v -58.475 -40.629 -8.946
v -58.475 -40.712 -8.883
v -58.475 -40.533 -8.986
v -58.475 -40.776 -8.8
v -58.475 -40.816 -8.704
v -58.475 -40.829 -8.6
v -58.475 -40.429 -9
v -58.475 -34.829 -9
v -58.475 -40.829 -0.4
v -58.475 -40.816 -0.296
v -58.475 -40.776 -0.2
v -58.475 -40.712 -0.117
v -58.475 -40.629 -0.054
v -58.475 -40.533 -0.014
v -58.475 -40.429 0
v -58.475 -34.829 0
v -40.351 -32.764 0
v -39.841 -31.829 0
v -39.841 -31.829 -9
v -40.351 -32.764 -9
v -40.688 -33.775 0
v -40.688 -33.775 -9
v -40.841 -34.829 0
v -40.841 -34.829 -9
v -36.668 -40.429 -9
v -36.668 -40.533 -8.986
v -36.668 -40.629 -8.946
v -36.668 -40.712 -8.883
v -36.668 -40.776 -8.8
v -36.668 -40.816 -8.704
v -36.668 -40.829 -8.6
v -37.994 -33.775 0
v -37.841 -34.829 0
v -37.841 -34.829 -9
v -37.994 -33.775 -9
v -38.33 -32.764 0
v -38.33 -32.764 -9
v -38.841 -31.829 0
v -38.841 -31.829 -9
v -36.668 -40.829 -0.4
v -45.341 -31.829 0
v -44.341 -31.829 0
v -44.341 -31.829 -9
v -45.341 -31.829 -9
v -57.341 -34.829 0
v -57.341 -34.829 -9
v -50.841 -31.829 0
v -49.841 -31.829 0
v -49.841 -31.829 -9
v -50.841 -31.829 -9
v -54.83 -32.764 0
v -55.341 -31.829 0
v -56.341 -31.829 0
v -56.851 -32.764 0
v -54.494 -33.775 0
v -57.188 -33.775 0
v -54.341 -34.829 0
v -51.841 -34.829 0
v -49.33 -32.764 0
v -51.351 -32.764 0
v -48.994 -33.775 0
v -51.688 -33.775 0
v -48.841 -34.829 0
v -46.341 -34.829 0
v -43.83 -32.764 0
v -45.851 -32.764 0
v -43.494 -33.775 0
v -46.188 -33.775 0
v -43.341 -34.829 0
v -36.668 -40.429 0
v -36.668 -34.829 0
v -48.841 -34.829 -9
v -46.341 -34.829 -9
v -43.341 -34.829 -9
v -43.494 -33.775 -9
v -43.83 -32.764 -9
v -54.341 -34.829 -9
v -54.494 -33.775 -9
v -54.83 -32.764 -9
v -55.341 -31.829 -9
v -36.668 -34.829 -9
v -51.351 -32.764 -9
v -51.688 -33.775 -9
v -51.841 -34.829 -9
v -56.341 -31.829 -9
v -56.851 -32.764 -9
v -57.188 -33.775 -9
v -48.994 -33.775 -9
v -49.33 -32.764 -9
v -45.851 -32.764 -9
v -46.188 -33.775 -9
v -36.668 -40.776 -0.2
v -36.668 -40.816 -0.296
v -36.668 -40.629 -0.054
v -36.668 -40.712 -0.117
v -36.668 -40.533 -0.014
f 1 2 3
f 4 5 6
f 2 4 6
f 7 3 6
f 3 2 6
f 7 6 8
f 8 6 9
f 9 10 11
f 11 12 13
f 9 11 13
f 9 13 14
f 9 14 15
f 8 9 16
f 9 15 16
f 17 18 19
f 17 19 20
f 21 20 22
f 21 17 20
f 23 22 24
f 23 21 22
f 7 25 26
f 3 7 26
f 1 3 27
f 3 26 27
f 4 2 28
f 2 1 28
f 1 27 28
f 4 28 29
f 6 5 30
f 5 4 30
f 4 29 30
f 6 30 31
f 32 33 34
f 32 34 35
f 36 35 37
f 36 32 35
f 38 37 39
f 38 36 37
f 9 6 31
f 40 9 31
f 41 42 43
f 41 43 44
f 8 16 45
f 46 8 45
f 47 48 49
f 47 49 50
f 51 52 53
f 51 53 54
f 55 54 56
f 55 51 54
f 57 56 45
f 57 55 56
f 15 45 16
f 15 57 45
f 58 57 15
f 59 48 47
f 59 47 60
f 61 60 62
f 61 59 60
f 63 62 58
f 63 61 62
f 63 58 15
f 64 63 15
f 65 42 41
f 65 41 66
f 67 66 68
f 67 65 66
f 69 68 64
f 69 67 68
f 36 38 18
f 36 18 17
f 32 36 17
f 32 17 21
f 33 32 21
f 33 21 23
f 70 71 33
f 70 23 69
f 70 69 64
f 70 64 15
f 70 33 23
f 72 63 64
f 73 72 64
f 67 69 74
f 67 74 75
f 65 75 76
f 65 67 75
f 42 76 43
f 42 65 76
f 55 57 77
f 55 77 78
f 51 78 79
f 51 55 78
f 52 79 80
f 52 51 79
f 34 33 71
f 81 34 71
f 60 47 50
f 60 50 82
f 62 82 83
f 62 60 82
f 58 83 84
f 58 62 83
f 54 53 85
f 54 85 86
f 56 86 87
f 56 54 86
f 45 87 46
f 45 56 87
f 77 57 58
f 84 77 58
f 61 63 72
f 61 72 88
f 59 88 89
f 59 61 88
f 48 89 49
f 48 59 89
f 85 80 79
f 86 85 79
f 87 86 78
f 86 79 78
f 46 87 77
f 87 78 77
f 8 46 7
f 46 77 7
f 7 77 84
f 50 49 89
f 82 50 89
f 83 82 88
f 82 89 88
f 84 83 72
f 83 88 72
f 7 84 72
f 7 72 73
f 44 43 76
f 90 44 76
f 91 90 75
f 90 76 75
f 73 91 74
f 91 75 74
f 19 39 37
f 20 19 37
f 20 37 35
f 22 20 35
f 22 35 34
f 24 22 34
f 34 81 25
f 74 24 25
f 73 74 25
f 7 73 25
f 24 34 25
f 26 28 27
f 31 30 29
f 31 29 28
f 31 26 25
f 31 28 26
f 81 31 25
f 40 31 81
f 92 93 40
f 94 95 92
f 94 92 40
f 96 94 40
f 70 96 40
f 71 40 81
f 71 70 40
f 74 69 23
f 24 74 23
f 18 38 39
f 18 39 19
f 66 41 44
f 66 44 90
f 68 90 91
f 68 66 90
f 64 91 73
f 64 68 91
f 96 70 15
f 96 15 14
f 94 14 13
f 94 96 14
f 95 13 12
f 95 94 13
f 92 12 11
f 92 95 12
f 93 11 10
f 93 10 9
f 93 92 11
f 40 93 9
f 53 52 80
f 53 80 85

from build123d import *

# Parameters (mm, degrees)
SKETCH1_W                 = 230
SKETCH1_H                 = 6
BOSS_EXTRUDE1_DEPTH       = 9
BOSS_EXTRUDE2_DEPTH       = 9
LPATTERN1_COUNT           = 41
LPATTERN1_PITCH           = 5.5
SKETCH2_W                 = 15
SKETCH2_H                 = 20
BOSS_EXTRUDE3_DEPTH       = 5
FILLET1_R                 = 10
FILLET2_R                 = 3
SKETCH3_W                 = 13
SKETCH3_H                 = 8
BOSS_EXTRUDE4_DEPTH       = 5
SKETCH4_W                 = 3
SKETCH4_H                 = 8
BOSS_EXTRUDE5_DEPTH       = 5
FILLET3_R                 = 0.4
F_3_0MM_DOWEL_HOLE1_D     = 2.7
F_3_0MM_DOWEL_HOLE1_DEPTH = 7
F_3_0MM_DOWEL_HOLE1_TIP   = 0.811161836
SKETCH6_W                 = 22.006931309
SKETCH6_H                 = 16.378230192
SKETCH6_W_2               = 21.806931309
SKETCH6_H_2               = 16.178230192
CUT_EXTRUDE1_DEPTH        = 180.611613715


with BuildPart() as part:
    # Sketch1 → Boss-Extrude1 (new body)
    with BuildSketch(Plane.XY):
        with Locations((54.307342656, -37.82930415)):
            Rectangle(SKETCH1_W, SKETCH1_H)
    extrude(amount=-BOSS_EXTRUDE1_DEPTH)

    # Sketch1<3> → Boss-Extrude2 (add)
    with BuildSketch(Plane.XY):
        with BuildLine():
            ThreePointArc((-56.340727793, -31.82930415), (-57.041926016, -33.262238075), (-57.340727793, -34.82930415))
            Line((-57.340727793, -34.82930415), (-54.340727793, -34.82930415))
            ThreePointArc((-54.340727793, -34.82930415), (-54.63952957, -33.262238075), (-55.340727793, -31.82930415))
            Line((-55.340727793, -31.82930415), (-56.340727793, -31.82930415))
        make_face()
    boss_extrude2 = extrude(amount=-BOSS_EXTRUDE2_DEPTH)

    # LPattern1: Boss-Extrude2 ×41
    with Locations(*[(i * LPATTERN1_PITCH, 0, 0) for i in range(1, LPATTERN1_COUNT)]):
        add(boss_extrude2)

    # Sketch2 → Boss-Extrude3 (add)
    with BuildSketch(Plane.XZ.offset(40.82930415)):
        with Locations((-68.192657344, -4.5)):
            Rectangle(SKETCH2_W, SKETCH2_H)
    extrude(amount=-BOSS_EXTRUDE3_DEPTH)

    # Fillet1
    # the kernel refuses this fillet: 10 mm, written as the material it adds along each edge
    with BuildSketch(Plane(origin=(-60.692657344, -35.82930415, 0), x_dir=(0, 1, 0), z_dir=(0, 0, -1))) as fillet1_piece_1:
        with BuildLine():
            CenterArc((10, -4.358898944), FILLET1_R, 154.158067237, 25.841932763)
            Line((0, -4.358898944), (0, 0))
            Line((0, 0), (1, 0))
        make_face()
    extrude(amount=9)

    # Fillet2
    fillet2_edges = [part.edges().sort_by_distance(p)[0] for p in [
        (-60.692657344, -38.32930415, 5.5),
        (-60.692657344, -38.32930415, -14.5),
        (-75.692657344, -38.32930415, -14.5),
        (-75.692657344, -38.32930415, 5.5),
    ]]
    fillet(fillet2_edges, radius=FILLET2_R)

    # Sketch3 → Boss-Extrude4 (add)
    with BuildSketch(Plane(origin=(169.307342656, 0, 0), x_dir=(0, 0, -1), z_dir=(1, 0, 0))):
        with Locations((4.5, -36.82930415)):
            Rectangle(SKETCH3_W, SKETCH3_H)
    extrude(amount=BOSS_EXTRUDE4_DEPTH)

    # Sketch4 → Boss-Extrude5 (add)
    with BuildSketch(Plane.XY.offset(2)):
        with Locations((170.807342656, -36.82930415)):
            Rectangle(SKETCH4_W, SKETCH4_H)
    extrude(amount=BOSS_EXTRUDE5_DEPTH)

    # Fillet3
    fillet3_edges = [part.edges().sort_by_distance(p)[0] for p in [
        (54.307342656, -40.82930415, -9),
        (-60.692657344, -40.82930415, 1.25),
        (-68.192657344, -40.82930415, -14.5),
        (-68.192657344, -40.82930415, 5.5),
        (-75.692657344, -40.82930415, -4.5),
        (-60.692657344, -40.82930415, -10.25),
        (-61.571337, -40.82930415, 4.621320344),
        (-74.813977688, -40.82930415, 4.621320344),
        (-74.813977688, -40.82930415, -13.621320344),
        (-61.571337, -40.82930415, -13.621320344),
        (173.307342656, -32.82930415, 2),
        (169.307342656, -40.82930415, 3.5),
        (169.307342656, -40.82930415, -10),
        (173.307342656, -40.82930415, 2),
        (171.807342656, -40.82930415, -11),
        (169.307342656, -32.82930415, -2),
        (171.807342656, -32.82930415, -11),
        (174.307342656, -36.82930415, 2),
        (174.307342656, -40.82930415, -4.5),
        (174.307342656, -36.82930415, -11),
        (174.307342656, -32.82930415, -4.5),
        (172.307342656, -36.82930415, 2),
        (172.307342656, -40.82930415, 4.5),
        (172.307342656, -32.82930415, 4.5),
        (169.307342656, -36.82930415, 7),
        (170.807342656, -40.82930415, 7),
        (172.307342656, -36.82930415, 7),
        (170.807342656, -32.82930415, 7),
        (54.307342656, -40.82930415, 0),
    ]]
    fillet(fillet3_edges, radius=FILLET3_R)

    # Ø3.0mm Dowel Hole1
    with Locations(Plane(origin=(-65.692657344, -40.82930415, 1.5), x_dir=(0, 0, -1), z_dir=(0, -1, 0))):
        with Locations((0, 0), (12, 0), (5.991996797, -6)):
            Hole(F_3_0MM_DOWEL_HOLE1_D / 2, depth=F_3_0MM_DOWEL_HOLE1_DEPTH)
            with Locations((0, 0, -(F_3_0MM_DOWEL_HOLE1_DEPTH + F_3_0MM_DOWEL_HOLE1_TIP / 2))):  # 118° drill point
                Cone(0, F_3_0MM_DOWEL_HOLE1_D / 2, F_3_0MM_DOWEL_HOLE1_TIP, mode=Mode.SUBTRACT)

    # Sketch6 → Cut-Extrude1 (cut, through all)
    with BuildSketch(Plane.XY):
        with Locations((-47.571737998, -32.740189054)):
            Rectangle(SKETCH6_W, SKETCH6_H)
        with Locations((-47.571737998, -32.740189054)):
            Rectangle(SKETCH6_W_2, SKETCH6_H_2, mode=Mode.SUBTRACT)
    extrude(amount=-CUT_EXTRUDE1_DEPTH, mode=Mode.SUBTRACT)


with BuildPart() as cut_extrude1_piece_1:
    # of the separate pieces the step leaves, piece 1, a body of its own (cut_extrude1_pieces)
    add(part.part.solids().sort_by_distance((-36.568272343, -40.82930415, -8.6))[0])


with BuildPart() as cut_extrude1_piece_2:
    # of the separate pieces the step leaves, piece 2, a body of its own (cut_extrude1_pieces)
    add(part.part.solids().sort_by_distance((-58.575203652, -40.82930415, -0.4))[0])


with BuildPart() as cut_extrude1_piece_3:
    # of the separate pieces the step leaves, piece 3, a body of its own (cut_extrude1_pieces)
    add(part.part.solids().sort_by_distance((-58.475203652, -40.82930415, -8.6))[0])


solid = cut_extrude1_piece_3.part
